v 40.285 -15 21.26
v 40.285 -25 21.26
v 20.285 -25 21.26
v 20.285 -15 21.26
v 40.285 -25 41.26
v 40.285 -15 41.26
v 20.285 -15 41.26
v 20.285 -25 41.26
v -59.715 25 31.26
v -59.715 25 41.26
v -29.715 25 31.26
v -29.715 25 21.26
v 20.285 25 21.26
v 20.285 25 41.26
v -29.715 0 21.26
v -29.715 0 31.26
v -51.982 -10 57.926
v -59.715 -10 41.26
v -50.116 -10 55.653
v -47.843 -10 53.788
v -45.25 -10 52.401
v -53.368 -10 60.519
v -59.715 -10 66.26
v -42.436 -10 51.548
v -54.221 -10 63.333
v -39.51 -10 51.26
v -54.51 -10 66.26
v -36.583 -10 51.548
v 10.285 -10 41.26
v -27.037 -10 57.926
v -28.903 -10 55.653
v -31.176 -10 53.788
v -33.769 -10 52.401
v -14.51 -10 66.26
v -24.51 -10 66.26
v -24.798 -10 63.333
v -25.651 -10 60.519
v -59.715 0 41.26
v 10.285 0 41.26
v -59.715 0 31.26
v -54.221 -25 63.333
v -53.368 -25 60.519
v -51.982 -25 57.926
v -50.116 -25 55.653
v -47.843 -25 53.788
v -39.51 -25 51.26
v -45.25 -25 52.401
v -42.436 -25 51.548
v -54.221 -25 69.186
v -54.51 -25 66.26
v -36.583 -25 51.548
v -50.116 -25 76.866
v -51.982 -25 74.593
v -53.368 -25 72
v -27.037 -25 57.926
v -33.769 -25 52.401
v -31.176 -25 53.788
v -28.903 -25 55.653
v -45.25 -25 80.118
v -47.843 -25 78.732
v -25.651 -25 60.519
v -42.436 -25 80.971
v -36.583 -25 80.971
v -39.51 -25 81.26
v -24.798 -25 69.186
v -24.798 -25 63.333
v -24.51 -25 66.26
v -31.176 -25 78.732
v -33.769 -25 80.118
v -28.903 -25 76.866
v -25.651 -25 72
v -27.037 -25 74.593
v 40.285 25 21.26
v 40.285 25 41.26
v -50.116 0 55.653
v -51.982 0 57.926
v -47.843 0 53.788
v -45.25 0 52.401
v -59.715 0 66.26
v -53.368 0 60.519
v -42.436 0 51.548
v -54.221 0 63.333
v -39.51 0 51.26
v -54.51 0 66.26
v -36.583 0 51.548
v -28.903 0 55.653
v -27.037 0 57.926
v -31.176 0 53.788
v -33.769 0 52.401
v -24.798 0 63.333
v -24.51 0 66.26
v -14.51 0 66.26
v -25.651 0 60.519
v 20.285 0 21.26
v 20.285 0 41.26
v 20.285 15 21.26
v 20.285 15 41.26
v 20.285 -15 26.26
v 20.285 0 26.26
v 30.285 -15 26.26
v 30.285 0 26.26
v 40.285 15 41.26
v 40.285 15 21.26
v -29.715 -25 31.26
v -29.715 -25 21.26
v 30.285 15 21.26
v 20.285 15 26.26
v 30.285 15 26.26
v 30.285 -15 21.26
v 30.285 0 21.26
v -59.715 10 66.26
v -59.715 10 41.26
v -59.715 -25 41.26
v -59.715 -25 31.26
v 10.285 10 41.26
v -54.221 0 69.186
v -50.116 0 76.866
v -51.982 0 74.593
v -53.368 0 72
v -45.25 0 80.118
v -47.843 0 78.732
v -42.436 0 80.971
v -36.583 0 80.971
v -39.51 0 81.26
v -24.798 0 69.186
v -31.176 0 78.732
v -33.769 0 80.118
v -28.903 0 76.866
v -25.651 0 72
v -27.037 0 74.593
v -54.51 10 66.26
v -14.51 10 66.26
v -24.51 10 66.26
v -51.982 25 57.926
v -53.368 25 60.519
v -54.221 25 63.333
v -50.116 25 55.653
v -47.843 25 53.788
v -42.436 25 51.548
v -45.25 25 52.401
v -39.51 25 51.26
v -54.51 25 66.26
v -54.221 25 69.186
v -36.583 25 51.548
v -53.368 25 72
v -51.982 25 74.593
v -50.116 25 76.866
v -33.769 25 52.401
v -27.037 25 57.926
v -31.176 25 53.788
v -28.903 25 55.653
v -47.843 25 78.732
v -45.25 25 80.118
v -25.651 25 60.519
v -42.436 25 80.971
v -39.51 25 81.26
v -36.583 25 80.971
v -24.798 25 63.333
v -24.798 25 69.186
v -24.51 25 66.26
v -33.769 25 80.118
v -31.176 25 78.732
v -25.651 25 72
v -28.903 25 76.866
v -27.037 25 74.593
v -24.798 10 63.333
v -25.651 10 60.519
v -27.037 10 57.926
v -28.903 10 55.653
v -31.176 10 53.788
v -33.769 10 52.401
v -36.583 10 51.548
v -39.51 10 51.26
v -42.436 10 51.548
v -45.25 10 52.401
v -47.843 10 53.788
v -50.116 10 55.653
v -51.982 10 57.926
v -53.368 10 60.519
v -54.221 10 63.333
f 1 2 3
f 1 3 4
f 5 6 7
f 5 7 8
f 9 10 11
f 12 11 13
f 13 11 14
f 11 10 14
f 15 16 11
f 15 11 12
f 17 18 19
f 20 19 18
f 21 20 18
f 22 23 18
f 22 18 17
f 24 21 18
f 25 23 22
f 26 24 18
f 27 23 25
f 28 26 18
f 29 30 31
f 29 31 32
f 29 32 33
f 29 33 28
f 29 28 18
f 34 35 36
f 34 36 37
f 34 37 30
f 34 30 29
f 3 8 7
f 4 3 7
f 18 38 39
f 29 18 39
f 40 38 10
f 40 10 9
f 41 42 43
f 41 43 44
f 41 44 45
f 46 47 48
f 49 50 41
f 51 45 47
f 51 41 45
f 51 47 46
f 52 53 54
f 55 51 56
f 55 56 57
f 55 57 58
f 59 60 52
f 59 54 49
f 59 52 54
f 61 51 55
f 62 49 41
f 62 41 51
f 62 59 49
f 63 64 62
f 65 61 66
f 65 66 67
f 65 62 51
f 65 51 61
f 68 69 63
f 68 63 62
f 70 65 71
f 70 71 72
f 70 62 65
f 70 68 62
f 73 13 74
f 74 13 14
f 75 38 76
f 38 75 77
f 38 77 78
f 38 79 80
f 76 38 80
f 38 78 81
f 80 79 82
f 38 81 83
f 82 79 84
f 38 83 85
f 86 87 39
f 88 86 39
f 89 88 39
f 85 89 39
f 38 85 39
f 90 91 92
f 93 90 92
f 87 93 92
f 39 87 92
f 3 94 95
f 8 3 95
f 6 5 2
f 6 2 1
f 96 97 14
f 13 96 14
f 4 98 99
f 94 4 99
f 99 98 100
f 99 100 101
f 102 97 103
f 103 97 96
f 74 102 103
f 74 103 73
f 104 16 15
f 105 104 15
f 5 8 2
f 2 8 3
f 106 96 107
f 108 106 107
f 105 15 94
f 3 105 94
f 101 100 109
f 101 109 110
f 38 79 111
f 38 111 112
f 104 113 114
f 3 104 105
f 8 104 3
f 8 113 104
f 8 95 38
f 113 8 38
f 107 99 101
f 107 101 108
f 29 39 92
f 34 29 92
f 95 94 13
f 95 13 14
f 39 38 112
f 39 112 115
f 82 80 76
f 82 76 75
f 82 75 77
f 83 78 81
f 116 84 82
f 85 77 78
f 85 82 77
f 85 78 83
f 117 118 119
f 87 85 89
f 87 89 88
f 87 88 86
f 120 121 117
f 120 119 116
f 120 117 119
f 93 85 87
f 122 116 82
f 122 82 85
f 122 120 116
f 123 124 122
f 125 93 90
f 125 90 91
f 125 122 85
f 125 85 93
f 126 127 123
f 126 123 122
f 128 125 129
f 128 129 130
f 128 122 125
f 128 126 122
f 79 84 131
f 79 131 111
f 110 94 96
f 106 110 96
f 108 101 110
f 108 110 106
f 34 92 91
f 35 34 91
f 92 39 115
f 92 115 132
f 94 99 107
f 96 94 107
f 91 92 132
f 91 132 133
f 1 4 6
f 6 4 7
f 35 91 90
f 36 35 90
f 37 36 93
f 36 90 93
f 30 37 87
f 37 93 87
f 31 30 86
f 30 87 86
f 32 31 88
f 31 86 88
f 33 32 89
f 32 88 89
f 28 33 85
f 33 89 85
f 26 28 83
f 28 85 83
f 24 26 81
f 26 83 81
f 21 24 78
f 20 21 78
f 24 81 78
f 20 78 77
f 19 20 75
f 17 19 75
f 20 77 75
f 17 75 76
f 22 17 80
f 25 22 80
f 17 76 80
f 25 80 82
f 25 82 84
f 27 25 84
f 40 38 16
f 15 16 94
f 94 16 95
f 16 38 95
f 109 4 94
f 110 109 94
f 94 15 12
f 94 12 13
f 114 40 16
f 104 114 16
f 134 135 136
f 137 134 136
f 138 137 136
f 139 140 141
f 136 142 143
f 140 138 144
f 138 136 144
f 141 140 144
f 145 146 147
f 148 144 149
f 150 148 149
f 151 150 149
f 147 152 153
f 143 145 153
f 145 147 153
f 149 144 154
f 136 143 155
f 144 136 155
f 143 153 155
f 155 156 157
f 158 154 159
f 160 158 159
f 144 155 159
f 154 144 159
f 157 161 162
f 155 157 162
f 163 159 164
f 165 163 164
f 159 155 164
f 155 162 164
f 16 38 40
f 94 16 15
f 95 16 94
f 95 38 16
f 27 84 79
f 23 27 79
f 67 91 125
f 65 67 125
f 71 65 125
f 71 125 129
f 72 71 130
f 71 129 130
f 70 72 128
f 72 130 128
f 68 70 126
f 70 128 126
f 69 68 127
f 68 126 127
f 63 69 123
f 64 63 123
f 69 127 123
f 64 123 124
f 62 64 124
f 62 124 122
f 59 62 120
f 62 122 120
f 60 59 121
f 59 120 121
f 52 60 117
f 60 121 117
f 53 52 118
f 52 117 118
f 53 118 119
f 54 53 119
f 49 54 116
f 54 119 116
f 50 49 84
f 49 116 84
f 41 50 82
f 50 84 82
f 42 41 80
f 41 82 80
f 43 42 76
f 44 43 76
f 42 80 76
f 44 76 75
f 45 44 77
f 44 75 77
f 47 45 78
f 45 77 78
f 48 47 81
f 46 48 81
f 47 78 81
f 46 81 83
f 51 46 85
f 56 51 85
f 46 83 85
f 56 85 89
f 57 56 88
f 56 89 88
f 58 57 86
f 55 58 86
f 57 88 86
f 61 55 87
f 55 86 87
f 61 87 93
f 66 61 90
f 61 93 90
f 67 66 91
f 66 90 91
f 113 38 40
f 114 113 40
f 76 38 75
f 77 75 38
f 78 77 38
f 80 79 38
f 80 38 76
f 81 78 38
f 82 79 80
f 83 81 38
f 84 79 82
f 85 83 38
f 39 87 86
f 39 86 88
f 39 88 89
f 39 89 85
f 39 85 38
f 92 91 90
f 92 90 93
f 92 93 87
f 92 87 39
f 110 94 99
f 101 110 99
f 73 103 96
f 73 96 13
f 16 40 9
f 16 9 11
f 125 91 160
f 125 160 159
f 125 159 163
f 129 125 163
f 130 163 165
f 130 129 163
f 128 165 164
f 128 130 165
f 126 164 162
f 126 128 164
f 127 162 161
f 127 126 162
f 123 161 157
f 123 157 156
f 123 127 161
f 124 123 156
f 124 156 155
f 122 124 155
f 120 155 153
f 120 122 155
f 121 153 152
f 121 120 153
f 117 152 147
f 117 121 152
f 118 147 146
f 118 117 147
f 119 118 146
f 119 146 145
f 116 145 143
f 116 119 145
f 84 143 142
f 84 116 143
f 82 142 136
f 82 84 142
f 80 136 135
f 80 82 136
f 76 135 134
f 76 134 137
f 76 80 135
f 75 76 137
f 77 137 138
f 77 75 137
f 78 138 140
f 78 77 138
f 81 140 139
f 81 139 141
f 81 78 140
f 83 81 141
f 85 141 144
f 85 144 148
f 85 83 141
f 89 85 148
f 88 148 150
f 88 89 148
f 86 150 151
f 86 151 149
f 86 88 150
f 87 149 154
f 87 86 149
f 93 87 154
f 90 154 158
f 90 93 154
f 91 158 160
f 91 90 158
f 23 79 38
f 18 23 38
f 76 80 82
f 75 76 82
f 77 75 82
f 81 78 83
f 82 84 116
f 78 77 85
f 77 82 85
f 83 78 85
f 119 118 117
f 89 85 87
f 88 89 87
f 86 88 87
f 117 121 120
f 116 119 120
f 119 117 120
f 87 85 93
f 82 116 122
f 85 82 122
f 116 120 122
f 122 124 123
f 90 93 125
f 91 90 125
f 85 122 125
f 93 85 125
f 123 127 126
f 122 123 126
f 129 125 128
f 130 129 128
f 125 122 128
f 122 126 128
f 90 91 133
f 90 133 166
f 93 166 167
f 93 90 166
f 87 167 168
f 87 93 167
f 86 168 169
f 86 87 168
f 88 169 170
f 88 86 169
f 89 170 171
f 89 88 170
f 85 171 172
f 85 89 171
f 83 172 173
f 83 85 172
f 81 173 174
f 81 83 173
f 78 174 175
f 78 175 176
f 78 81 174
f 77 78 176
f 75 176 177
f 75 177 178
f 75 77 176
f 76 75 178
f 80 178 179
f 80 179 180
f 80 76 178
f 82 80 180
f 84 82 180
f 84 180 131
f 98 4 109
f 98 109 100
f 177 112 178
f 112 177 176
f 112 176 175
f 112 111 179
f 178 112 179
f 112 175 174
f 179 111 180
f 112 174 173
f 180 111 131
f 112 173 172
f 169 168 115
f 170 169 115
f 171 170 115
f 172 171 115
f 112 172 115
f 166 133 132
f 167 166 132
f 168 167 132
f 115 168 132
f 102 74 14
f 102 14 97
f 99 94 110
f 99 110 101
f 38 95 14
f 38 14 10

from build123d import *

# Parameters (mm, degrees)
F1_DEPTH = 25
F2_DEPTH = 25
F3_DEPTH = 10
F4_DEPTH = 10
F7_DEPTH = 20
F5_W     = 15
F5_H     = 5
F8_DEPTH = 10
F6_W     = 15
F6_H     = 5


with BuildPart() as f1:
    # F0 (on Front) → F1 (new body)
    with BuildSketch(Plane.XZ):
        with BuildLine():
            ThreePointArc((-54.50950411, 66.2596747279), (-39.50950411, 51.2596747279), (-24.50950411, 66.2596747279))
            ThreePointArc((-24.50950411, 66.2596747279), (-39.50950411, 81.2596747279), (-54.50950411, 66.2596747279))
        make_face()
    extrude(amount=F1_DEPTH)


with BuildPart() as f1b:
    # F0 (on Front) → F1, piece 2 (new body)
    with BuildSketch(Plane.XZ):
        Polygon((-29.7151772691, 21.2596747279), (20.2848227309, 21.2596747279), (20.2848227309, 41.2596747279), (10.2848227309, 41.2596747279), (-59.7151772691, 41.2596747279), (-59.7151772691, 31.2596747279), (-29.7151772691, 31.2596747279), align=None)
    extrude(amount=F1_DEPTH)


with BuildPart() as f2:
    # F2 (new): a face of the model
    f2_faces = [f1.part.faces().sort_by_distance(p)[0] for p in [
        (-39.50950411, 0, 66.2596747279),
    ]]
    extrude(f2_faces, amount=F2_DEPTH)


with BuildPart() as f2b:
    # F2#2 (new): a face of the model
    f2_2_faces = [f1b.part.faces().sort_by_distance(p)[0] for p in [
        (-13.9459464999, 0, 32.4135208818),
    ]]
    extrude(f2_2_faces, amount=F2_DEPTH)


with BuildPart() as f3:
    # F0 (on Front) → F3 (new body)
    with BuildSketch(Plane.XZ):
        with BuildLine():
            Line((-59.7151772691, 41.2596747279), (10.2848227309, 41.2596747279))
            Line((10.2848227309, 41.2596747279), (-14.50950411, 66.2596747279))
            Line((-14.50950411, 66.2596747279), (-24.50950411, 66.2596747279))
            ThreePointArc((-24.50950411, 66.2596747279), (-39.50950411, 51.2596747279), (-54.50950411, 66.2596747279))
            Line((-54.50950411, 66.2596747279), (-59.7151772691, 66.2596747279))
            Line((-59.7151772691, 66.2596747279), (-59.7151772691, 41.2596747279))
        make_face()
    extrude(amount=F3_DEPTH)


with BuildPart() as f4:
    # F0 (on Front) → F4 (new body)
    with BuildSketch(Plane.XZ):
        with BuildLine():
            Line((-59.7151772691, 41.2596747279), (10.2848227309, 41.2596747279))
            Line((10.2848227309, 41.2596747279), (-14.50950411, 66.2596747279))
            Line((-14.50950411, 66.2596747279), (-24.50950411, 66.2596747279))
            ThreePointArc((-24.50950411, 66.2596747279), (-39.50950411, 51.2596747279), (-54.50950411, 66.2596747279))
            Line((-54.50950411, 66.2596747279), (-59.7151772691, 66.2596747279))
            Line((-59.7151772691, 66.2596747279), (-59.7151772691, 41.2596747279))
        make_face()
    extrude(amount=-F4_DEPTH)


with BuildPart() as f7:
    # F5 (on face) → F7 (new body)
    with BuildSketch(Plane.YZ.offset(20.2848227309)):
        Polygon((-15, 26.2596747279), (-15, 41.2596747279), (-25, 41.2596747279), (-25, 21.2596747279), (-15, 21.2596747279), align=None)
    extrude(amount=F7_DEPTH)


with BuildPart() as f7b:
    # F6 (on face) → F7, piece 2 (new body)
    with BuildSketch(Plane.YZ.offset(20.2848227309)):
        Polygon((25, 41.2596747279), (15, 41.2596747279), (15, 26.2596747279), (15, 21.2596747279), (25, 21.2596747279), align=None)
    extrude(amount=F7_DEPTH)


with BuildPart() as f8:
    # F5 (on face) → F8 (new body)
    with BuildSketch(Plane.YZ.offset(20.2848227309)):
        with Locations((-7.5, 23.7596747279)):
            Rectangle(F5_W, F5_H)
    extrude(amount=F8_DEPTH)


with BuildPart() as f8b:
    # F6 (on face) → F8, piece 2 (new body)
    with BuildSketch(Plane.YZ.offset(20.2848227309)):
        with Locations((7.5, 23.7596747279)):
            Rectangle(F6_W, F6_H)
    extrude(amount=F8_DEPTH)


solid = Compound([f1.part, f1b.part, f2.part, f2b.part, f3.part, f4.part, f7.part, f7b.part, f8.part, f8b.part])
